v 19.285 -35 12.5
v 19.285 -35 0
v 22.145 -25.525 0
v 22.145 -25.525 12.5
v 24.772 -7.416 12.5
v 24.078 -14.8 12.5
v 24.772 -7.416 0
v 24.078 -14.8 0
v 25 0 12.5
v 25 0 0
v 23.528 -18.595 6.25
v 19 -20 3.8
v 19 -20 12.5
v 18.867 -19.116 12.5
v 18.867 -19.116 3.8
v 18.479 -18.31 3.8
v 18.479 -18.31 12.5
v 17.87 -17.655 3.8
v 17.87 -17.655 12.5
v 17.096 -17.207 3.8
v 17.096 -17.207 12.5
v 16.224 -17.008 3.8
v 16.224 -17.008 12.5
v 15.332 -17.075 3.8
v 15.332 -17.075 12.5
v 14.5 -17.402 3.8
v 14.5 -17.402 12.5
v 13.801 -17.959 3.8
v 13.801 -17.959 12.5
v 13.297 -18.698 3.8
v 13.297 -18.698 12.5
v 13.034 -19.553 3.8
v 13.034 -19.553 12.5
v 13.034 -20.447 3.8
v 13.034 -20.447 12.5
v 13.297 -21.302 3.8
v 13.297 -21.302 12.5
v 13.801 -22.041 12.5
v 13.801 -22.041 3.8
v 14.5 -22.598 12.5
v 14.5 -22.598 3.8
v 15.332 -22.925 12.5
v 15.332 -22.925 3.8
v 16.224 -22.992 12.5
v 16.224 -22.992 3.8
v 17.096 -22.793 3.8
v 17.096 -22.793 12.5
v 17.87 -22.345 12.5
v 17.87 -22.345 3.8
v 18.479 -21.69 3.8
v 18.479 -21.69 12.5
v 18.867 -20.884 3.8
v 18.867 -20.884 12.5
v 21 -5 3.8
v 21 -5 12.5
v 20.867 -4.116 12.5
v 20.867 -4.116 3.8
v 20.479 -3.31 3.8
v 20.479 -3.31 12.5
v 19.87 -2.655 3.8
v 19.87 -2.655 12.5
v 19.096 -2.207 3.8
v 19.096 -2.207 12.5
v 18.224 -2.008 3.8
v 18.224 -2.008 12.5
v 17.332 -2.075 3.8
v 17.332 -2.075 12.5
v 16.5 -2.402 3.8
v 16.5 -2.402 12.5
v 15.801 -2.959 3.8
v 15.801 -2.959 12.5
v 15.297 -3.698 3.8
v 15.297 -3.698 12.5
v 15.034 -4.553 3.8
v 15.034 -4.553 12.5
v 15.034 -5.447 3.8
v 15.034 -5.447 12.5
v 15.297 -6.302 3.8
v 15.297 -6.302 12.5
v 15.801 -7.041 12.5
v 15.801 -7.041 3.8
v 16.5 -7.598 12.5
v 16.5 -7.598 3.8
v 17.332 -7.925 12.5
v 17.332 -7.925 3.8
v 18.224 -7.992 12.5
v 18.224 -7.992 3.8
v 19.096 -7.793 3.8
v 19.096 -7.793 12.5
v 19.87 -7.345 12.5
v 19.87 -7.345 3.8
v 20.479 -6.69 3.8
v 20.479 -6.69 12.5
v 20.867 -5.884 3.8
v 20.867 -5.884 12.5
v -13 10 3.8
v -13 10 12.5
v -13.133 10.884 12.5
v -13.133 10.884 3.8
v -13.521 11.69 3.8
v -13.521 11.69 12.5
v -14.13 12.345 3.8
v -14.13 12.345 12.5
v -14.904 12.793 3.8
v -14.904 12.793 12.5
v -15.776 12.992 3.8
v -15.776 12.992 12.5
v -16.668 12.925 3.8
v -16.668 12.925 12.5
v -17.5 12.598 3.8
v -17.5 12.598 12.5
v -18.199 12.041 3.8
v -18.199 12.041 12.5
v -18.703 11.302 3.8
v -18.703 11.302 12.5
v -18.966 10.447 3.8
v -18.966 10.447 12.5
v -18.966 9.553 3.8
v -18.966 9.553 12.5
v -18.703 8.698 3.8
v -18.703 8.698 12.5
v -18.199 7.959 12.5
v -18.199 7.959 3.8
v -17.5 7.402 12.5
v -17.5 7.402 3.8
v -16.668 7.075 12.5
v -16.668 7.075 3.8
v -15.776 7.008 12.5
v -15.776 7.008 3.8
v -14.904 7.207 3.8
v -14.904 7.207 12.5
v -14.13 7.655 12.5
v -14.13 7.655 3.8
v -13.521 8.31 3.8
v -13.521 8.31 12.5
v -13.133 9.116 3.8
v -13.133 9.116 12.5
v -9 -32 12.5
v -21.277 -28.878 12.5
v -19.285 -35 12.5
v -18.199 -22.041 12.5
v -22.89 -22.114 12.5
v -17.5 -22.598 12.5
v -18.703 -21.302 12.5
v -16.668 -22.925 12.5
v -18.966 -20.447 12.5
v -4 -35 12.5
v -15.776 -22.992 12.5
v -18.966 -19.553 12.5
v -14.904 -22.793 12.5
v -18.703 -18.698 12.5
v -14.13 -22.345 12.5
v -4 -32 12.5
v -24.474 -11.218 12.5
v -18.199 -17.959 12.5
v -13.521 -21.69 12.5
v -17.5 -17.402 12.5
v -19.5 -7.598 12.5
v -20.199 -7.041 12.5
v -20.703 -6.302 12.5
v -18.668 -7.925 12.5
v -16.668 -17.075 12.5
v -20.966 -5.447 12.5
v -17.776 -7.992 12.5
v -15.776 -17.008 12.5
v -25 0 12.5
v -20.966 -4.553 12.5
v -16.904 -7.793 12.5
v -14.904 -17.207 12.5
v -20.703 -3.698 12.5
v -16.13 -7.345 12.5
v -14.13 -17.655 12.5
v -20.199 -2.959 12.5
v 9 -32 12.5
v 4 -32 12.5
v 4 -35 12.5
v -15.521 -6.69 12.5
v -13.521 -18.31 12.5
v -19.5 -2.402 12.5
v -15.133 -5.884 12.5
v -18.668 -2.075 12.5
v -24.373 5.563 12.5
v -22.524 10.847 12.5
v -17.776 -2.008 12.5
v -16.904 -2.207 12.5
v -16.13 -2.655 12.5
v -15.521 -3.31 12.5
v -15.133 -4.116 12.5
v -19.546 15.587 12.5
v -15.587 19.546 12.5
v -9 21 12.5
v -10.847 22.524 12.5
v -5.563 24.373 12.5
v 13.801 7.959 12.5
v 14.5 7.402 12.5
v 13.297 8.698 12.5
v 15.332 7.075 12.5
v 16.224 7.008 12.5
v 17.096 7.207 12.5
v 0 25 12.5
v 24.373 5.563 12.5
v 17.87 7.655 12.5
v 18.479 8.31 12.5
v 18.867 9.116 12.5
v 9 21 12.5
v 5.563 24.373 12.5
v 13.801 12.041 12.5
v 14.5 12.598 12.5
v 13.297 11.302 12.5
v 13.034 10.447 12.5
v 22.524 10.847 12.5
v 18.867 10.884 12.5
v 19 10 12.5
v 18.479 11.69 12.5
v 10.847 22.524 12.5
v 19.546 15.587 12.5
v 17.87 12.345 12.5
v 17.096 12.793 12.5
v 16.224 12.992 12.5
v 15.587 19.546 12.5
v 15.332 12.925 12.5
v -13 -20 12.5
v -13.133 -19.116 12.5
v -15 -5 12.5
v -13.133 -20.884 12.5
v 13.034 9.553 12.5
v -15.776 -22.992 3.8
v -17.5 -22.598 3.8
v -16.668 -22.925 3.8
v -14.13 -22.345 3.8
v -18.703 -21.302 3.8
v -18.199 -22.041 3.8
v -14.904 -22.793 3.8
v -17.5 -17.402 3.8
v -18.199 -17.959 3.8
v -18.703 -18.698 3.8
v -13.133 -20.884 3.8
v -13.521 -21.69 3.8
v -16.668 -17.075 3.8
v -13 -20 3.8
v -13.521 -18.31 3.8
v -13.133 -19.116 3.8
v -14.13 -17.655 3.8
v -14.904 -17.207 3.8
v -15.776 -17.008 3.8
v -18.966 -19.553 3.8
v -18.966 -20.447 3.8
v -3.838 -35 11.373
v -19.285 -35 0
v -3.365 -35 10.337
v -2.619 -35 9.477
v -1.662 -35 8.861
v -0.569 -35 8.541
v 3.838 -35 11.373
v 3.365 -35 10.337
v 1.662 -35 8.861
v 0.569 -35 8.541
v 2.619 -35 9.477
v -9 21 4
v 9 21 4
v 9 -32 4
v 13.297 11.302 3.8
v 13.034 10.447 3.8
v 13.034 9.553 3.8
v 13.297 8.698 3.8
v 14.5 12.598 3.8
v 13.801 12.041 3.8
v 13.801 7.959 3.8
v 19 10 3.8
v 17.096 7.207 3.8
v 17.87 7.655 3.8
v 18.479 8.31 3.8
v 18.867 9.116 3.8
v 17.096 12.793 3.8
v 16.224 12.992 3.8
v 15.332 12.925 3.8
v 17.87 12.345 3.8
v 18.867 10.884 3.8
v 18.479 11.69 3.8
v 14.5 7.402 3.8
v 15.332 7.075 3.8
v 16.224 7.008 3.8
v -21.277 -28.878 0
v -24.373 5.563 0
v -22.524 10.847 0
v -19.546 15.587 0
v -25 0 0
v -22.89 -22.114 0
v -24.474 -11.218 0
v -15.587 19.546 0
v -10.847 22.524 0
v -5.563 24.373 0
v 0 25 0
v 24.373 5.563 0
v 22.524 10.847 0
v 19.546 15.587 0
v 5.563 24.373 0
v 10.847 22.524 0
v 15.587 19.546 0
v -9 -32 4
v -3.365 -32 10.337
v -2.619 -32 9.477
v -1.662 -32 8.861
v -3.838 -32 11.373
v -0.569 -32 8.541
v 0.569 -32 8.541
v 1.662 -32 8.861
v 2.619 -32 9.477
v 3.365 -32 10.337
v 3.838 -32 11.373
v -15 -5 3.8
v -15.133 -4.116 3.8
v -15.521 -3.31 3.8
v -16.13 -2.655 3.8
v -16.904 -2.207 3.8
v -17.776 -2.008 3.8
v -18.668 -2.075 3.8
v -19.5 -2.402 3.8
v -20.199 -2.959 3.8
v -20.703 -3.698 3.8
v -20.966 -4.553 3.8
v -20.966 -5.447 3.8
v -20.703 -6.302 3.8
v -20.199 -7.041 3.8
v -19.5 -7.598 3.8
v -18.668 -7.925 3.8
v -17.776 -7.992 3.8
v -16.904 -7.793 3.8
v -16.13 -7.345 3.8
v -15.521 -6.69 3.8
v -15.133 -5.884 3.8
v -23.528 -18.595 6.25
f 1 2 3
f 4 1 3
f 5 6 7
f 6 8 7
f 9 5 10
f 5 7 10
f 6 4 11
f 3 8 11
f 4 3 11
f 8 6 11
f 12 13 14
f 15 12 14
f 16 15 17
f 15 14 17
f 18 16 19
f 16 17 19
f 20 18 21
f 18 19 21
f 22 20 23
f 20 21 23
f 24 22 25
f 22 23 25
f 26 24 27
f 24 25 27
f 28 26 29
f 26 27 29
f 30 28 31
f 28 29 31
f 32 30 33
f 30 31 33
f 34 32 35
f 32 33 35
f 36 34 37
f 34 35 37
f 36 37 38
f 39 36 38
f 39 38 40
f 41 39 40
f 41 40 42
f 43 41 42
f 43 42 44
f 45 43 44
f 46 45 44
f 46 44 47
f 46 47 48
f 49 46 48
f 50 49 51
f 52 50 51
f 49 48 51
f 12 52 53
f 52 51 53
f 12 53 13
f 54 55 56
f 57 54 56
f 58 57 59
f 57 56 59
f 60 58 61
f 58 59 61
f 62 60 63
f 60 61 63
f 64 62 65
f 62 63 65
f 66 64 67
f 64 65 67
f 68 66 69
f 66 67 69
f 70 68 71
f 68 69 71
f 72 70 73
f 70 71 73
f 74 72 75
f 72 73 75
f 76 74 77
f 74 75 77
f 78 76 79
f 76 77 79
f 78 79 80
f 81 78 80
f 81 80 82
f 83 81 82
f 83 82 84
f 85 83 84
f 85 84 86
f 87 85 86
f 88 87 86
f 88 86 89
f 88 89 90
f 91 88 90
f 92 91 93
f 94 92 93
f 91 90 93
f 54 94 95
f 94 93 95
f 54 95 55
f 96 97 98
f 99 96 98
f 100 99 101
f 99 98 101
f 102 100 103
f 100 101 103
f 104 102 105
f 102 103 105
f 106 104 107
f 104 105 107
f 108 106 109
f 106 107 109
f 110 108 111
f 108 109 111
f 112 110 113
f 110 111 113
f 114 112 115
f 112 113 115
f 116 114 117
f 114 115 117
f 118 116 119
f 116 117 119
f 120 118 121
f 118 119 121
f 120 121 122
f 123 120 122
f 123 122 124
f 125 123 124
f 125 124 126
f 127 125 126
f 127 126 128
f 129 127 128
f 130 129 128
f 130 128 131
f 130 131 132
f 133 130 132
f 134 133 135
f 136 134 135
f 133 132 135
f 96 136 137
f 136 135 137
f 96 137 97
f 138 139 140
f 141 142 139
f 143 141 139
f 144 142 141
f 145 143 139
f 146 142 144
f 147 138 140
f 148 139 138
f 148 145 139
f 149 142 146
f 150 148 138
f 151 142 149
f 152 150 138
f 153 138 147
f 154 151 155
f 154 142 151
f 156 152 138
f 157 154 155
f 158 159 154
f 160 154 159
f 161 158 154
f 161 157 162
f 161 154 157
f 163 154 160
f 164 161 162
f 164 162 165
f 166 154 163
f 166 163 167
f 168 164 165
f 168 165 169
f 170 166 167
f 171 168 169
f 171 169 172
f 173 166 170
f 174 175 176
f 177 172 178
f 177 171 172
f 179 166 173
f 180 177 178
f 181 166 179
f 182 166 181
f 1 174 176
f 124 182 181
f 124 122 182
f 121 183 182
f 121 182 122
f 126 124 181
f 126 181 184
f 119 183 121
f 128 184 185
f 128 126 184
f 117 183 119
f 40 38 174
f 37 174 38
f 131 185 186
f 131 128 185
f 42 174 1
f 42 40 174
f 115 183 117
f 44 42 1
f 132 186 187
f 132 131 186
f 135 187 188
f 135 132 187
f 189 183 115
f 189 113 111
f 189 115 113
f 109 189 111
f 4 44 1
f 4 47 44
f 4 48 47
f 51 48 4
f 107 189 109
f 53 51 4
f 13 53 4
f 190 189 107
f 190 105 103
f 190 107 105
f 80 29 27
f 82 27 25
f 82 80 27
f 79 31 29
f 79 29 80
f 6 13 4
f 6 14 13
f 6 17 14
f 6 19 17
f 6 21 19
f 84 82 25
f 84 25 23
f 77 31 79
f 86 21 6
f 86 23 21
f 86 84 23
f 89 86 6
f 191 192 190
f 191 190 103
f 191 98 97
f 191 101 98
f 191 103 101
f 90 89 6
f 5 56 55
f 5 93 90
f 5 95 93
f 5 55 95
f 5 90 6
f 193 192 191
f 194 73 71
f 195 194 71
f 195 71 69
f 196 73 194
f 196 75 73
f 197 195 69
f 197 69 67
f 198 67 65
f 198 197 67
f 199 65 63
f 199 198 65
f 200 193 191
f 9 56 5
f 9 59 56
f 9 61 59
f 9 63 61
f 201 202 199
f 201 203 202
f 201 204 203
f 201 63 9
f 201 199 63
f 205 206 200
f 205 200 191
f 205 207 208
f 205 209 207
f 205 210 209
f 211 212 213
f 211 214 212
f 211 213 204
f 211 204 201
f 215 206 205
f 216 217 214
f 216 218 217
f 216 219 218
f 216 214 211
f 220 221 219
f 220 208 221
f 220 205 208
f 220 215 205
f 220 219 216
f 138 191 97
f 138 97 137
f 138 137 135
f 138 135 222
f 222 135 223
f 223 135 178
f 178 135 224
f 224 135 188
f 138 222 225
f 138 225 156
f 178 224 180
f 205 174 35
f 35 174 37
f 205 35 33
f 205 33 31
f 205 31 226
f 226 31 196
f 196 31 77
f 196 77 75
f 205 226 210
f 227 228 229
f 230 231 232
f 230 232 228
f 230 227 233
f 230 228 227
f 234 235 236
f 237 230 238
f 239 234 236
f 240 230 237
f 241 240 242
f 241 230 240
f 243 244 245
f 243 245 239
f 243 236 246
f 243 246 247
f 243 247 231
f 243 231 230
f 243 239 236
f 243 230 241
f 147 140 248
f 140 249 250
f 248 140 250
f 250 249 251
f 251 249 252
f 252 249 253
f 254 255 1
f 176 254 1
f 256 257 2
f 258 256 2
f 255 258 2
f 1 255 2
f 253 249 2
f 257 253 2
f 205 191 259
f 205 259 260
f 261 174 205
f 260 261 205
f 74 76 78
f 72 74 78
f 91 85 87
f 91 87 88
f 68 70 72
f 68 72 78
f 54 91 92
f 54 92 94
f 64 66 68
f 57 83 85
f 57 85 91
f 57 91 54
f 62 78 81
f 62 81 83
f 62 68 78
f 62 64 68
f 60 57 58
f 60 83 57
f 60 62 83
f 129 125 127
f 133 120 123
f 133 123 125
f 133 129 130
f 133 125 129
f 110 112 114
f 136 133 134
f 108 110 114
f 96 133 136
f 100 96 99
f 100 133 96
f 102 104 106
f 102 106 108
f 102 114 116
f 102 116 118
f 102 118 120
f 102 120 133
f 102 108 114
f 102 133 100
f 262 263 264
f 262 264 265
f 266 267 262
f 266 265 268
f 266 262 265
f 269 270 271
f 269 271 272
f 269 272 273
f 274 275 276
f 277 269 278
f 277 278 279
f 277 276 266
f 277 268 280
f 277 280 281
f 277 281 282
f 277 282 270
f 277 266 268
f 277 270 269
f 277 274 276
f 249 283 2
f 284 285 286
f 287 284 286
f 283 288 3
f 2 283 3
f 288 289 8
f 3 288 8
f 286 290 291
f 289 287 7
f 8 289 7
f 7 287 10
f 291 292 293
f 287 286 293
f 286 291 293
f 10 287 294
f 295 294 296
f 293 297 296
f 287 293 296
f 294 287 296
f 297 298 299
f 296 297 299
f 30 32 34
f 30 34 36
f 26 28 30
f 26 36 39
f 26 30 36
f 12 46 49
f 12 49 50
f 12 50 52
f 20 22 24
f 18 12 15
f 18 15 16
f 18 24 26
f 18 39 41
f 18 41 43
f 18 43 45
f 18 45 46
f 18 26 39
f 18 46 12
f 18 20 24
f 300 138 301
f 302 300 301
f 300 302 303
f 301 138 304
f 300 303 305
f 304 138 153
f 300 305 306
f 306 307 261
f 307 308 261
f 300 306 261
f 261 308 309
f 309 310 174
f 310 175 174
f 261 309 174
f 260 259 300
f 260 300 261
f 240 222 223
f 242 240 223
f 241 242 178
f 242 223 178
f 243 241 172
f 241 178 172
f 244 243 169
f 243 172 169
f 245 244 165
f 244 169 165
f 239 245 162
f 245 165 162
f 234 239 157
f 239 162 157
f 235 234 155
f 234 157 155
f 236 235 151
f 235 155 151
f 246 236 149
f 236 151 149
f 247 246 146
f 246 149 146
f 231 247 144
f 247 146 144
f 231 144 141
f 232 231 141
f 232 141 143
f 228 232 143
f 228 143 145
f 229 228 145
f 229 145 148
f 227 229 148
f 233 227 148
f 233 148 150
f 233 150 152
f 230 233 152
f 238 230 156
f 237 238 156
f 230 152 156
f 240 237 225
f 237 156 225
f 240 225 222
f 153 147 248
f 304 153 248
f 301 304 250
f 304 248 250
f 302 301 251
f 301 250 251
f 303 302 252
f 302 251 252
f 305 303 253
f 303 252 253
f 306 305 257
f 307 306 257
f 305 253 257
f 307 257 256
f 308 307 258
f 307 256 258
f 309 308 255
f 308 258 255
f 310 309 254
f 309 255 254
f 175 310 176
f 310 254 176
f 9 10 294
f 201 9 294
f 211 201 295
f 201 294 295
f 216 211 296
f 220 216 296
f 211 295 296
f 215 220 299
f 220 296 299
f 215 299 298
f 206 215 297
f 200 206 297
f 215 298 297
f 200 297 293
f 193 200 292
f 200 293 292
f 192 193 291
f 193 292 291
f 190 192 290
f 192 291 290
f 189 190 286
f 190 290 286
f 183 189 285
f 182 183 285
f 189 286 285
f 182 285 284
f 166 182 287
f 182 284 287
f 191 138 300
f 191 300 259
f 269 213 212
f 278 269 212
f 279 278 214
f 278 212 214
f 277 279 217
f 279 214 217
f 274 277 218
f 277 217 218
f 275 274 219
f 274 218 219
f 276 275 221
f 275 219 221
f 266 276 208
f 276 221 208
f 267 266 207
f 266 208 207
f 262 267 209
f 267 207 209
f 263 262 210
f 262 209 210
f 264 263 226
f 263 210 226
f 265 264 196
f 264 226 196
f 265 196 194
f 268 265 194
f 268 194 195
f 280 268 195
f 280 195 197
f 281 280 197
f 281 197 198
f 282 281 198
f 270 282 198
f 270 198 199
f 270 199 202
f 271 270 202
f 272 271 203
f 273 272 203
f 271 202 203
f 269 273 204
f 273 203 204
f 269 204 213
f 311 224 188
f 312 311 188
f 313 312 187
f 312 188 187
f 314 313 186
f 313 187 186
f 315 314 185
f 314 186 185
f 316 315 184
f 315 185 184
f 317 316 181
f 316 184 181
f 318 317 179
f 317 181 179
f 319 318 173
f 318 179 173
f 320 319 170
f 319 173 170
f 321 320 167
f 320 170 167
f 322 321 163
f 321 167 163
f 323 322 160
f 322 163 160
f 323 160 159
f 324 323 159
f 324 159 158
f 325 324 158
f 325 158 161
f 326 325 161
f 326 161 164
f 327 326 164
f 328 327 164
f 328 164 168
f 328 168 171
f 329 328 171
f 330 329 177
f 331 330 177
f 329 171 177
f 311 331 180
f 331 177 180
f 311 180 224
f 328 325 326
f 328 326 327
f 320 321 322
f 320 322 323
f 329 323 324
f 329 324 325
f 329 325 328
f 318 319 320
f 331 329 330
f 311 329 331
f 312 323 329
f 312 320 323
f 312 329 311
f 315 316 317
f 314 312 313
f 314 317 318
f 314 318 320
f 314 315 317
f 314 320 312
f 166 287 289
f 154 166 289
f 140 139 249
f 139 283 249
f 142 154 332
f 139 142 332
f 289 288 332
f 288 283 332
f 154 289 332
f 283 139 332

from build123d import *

# Parameters (mm, degrees)
SALIENTE_EXTRUIR5_DEPTH = 12.5
CROQUIS10_W             = 18
CROQUIS10_H             = 53
CORTAR_EXTRUIR1_DEPTH   = 8.5
CROQUIS11_R             = 4
CORTAR_EXTRUIR2_DEPTH   = 8
CROQUIS12_2_R           = 3
CORTAR_EXTRUIR3_DEPTH   = 8.7


with BuildPart() as part:
    # Croquis1 → Saliente-Extruir5 (new body)
    with BuildSketch(Plane.XY):
        with BuildLine():
            Line((-19.284730396, -35), (19.284730396, -35))
            add(Edge.make_bspline(
                [(19.284730396, -35), (25, -19.758503488), (25, 0)],
                knots=[0.881021326, 0.881021326, 0.881021326, 1.570796327, 1.570796327, 1.570796327], degree=2, weights=[1, 0.941113494, 1]))
            ThreePointArc((25, 0), (0, 25), (-25, 0))
            add(Edge.make_bspline(
                [(-25, 0), (-25, -19.758503488), (-19.284730396, -35)],
                knots=[4.71238898, 4.71238898, 4.71238898, 5.402163981, 5.402163981, 5.402163981], degree=2, weights=[1, 0.941113494, 1]))
        make_face()
    extrude(amount=SALIENTE_EXTRUIR5_DEPTH)

    # Croquis10 → Cortar-Extruir1 (cut)
    with BuildSketch(Plane.XY.offset(12.5)):
        with Locations((0, -5.5)):
            Rectangle(CROQUIS10_W, CROQUIS10_H)
    extrude(amount=-CORTAR_EXTRUIR1_DEPTH, mode=Mode.SUBTRACT)

    # Croquis11 → Cortar-Extruir2 (cut)
    with BuildSketch(Plane.XZ.offset(35)):
        with Locations((0, 12.5)):
            Circle(CROQUIS11_R)
    extrude(amount=-CORTAR_EXTRUIR2_DEPTH, mode=Mode.SUBTRACT)

    # Croquis12<2> → Cortar-Extruir3 (cut)
    with BuildSketch(Plane.XY.offset(12.5)):
        with Locations((16, -20)):
            Circle(CROQUIS12_2_R)
        with Locations((16, 10)):
            Circle(CROQUIS12_2_R)
        with Locations((-18, -5)):
            Circle(CROQUIS12_2_R)
        with Locations((18, -5)):
            Circle(CROQUIS12_2_R)
        with Locations((-16, -20)):
            Circle(CROQUIS12_2_R)
        with Locations((-16, 10)):
            Circle(CROQUIS12_2_R)
    extrude(amount=-CORTAR_EXTRUIR3_DEPTH, mode=Mode.SUBTRACT)


solid = part.part
